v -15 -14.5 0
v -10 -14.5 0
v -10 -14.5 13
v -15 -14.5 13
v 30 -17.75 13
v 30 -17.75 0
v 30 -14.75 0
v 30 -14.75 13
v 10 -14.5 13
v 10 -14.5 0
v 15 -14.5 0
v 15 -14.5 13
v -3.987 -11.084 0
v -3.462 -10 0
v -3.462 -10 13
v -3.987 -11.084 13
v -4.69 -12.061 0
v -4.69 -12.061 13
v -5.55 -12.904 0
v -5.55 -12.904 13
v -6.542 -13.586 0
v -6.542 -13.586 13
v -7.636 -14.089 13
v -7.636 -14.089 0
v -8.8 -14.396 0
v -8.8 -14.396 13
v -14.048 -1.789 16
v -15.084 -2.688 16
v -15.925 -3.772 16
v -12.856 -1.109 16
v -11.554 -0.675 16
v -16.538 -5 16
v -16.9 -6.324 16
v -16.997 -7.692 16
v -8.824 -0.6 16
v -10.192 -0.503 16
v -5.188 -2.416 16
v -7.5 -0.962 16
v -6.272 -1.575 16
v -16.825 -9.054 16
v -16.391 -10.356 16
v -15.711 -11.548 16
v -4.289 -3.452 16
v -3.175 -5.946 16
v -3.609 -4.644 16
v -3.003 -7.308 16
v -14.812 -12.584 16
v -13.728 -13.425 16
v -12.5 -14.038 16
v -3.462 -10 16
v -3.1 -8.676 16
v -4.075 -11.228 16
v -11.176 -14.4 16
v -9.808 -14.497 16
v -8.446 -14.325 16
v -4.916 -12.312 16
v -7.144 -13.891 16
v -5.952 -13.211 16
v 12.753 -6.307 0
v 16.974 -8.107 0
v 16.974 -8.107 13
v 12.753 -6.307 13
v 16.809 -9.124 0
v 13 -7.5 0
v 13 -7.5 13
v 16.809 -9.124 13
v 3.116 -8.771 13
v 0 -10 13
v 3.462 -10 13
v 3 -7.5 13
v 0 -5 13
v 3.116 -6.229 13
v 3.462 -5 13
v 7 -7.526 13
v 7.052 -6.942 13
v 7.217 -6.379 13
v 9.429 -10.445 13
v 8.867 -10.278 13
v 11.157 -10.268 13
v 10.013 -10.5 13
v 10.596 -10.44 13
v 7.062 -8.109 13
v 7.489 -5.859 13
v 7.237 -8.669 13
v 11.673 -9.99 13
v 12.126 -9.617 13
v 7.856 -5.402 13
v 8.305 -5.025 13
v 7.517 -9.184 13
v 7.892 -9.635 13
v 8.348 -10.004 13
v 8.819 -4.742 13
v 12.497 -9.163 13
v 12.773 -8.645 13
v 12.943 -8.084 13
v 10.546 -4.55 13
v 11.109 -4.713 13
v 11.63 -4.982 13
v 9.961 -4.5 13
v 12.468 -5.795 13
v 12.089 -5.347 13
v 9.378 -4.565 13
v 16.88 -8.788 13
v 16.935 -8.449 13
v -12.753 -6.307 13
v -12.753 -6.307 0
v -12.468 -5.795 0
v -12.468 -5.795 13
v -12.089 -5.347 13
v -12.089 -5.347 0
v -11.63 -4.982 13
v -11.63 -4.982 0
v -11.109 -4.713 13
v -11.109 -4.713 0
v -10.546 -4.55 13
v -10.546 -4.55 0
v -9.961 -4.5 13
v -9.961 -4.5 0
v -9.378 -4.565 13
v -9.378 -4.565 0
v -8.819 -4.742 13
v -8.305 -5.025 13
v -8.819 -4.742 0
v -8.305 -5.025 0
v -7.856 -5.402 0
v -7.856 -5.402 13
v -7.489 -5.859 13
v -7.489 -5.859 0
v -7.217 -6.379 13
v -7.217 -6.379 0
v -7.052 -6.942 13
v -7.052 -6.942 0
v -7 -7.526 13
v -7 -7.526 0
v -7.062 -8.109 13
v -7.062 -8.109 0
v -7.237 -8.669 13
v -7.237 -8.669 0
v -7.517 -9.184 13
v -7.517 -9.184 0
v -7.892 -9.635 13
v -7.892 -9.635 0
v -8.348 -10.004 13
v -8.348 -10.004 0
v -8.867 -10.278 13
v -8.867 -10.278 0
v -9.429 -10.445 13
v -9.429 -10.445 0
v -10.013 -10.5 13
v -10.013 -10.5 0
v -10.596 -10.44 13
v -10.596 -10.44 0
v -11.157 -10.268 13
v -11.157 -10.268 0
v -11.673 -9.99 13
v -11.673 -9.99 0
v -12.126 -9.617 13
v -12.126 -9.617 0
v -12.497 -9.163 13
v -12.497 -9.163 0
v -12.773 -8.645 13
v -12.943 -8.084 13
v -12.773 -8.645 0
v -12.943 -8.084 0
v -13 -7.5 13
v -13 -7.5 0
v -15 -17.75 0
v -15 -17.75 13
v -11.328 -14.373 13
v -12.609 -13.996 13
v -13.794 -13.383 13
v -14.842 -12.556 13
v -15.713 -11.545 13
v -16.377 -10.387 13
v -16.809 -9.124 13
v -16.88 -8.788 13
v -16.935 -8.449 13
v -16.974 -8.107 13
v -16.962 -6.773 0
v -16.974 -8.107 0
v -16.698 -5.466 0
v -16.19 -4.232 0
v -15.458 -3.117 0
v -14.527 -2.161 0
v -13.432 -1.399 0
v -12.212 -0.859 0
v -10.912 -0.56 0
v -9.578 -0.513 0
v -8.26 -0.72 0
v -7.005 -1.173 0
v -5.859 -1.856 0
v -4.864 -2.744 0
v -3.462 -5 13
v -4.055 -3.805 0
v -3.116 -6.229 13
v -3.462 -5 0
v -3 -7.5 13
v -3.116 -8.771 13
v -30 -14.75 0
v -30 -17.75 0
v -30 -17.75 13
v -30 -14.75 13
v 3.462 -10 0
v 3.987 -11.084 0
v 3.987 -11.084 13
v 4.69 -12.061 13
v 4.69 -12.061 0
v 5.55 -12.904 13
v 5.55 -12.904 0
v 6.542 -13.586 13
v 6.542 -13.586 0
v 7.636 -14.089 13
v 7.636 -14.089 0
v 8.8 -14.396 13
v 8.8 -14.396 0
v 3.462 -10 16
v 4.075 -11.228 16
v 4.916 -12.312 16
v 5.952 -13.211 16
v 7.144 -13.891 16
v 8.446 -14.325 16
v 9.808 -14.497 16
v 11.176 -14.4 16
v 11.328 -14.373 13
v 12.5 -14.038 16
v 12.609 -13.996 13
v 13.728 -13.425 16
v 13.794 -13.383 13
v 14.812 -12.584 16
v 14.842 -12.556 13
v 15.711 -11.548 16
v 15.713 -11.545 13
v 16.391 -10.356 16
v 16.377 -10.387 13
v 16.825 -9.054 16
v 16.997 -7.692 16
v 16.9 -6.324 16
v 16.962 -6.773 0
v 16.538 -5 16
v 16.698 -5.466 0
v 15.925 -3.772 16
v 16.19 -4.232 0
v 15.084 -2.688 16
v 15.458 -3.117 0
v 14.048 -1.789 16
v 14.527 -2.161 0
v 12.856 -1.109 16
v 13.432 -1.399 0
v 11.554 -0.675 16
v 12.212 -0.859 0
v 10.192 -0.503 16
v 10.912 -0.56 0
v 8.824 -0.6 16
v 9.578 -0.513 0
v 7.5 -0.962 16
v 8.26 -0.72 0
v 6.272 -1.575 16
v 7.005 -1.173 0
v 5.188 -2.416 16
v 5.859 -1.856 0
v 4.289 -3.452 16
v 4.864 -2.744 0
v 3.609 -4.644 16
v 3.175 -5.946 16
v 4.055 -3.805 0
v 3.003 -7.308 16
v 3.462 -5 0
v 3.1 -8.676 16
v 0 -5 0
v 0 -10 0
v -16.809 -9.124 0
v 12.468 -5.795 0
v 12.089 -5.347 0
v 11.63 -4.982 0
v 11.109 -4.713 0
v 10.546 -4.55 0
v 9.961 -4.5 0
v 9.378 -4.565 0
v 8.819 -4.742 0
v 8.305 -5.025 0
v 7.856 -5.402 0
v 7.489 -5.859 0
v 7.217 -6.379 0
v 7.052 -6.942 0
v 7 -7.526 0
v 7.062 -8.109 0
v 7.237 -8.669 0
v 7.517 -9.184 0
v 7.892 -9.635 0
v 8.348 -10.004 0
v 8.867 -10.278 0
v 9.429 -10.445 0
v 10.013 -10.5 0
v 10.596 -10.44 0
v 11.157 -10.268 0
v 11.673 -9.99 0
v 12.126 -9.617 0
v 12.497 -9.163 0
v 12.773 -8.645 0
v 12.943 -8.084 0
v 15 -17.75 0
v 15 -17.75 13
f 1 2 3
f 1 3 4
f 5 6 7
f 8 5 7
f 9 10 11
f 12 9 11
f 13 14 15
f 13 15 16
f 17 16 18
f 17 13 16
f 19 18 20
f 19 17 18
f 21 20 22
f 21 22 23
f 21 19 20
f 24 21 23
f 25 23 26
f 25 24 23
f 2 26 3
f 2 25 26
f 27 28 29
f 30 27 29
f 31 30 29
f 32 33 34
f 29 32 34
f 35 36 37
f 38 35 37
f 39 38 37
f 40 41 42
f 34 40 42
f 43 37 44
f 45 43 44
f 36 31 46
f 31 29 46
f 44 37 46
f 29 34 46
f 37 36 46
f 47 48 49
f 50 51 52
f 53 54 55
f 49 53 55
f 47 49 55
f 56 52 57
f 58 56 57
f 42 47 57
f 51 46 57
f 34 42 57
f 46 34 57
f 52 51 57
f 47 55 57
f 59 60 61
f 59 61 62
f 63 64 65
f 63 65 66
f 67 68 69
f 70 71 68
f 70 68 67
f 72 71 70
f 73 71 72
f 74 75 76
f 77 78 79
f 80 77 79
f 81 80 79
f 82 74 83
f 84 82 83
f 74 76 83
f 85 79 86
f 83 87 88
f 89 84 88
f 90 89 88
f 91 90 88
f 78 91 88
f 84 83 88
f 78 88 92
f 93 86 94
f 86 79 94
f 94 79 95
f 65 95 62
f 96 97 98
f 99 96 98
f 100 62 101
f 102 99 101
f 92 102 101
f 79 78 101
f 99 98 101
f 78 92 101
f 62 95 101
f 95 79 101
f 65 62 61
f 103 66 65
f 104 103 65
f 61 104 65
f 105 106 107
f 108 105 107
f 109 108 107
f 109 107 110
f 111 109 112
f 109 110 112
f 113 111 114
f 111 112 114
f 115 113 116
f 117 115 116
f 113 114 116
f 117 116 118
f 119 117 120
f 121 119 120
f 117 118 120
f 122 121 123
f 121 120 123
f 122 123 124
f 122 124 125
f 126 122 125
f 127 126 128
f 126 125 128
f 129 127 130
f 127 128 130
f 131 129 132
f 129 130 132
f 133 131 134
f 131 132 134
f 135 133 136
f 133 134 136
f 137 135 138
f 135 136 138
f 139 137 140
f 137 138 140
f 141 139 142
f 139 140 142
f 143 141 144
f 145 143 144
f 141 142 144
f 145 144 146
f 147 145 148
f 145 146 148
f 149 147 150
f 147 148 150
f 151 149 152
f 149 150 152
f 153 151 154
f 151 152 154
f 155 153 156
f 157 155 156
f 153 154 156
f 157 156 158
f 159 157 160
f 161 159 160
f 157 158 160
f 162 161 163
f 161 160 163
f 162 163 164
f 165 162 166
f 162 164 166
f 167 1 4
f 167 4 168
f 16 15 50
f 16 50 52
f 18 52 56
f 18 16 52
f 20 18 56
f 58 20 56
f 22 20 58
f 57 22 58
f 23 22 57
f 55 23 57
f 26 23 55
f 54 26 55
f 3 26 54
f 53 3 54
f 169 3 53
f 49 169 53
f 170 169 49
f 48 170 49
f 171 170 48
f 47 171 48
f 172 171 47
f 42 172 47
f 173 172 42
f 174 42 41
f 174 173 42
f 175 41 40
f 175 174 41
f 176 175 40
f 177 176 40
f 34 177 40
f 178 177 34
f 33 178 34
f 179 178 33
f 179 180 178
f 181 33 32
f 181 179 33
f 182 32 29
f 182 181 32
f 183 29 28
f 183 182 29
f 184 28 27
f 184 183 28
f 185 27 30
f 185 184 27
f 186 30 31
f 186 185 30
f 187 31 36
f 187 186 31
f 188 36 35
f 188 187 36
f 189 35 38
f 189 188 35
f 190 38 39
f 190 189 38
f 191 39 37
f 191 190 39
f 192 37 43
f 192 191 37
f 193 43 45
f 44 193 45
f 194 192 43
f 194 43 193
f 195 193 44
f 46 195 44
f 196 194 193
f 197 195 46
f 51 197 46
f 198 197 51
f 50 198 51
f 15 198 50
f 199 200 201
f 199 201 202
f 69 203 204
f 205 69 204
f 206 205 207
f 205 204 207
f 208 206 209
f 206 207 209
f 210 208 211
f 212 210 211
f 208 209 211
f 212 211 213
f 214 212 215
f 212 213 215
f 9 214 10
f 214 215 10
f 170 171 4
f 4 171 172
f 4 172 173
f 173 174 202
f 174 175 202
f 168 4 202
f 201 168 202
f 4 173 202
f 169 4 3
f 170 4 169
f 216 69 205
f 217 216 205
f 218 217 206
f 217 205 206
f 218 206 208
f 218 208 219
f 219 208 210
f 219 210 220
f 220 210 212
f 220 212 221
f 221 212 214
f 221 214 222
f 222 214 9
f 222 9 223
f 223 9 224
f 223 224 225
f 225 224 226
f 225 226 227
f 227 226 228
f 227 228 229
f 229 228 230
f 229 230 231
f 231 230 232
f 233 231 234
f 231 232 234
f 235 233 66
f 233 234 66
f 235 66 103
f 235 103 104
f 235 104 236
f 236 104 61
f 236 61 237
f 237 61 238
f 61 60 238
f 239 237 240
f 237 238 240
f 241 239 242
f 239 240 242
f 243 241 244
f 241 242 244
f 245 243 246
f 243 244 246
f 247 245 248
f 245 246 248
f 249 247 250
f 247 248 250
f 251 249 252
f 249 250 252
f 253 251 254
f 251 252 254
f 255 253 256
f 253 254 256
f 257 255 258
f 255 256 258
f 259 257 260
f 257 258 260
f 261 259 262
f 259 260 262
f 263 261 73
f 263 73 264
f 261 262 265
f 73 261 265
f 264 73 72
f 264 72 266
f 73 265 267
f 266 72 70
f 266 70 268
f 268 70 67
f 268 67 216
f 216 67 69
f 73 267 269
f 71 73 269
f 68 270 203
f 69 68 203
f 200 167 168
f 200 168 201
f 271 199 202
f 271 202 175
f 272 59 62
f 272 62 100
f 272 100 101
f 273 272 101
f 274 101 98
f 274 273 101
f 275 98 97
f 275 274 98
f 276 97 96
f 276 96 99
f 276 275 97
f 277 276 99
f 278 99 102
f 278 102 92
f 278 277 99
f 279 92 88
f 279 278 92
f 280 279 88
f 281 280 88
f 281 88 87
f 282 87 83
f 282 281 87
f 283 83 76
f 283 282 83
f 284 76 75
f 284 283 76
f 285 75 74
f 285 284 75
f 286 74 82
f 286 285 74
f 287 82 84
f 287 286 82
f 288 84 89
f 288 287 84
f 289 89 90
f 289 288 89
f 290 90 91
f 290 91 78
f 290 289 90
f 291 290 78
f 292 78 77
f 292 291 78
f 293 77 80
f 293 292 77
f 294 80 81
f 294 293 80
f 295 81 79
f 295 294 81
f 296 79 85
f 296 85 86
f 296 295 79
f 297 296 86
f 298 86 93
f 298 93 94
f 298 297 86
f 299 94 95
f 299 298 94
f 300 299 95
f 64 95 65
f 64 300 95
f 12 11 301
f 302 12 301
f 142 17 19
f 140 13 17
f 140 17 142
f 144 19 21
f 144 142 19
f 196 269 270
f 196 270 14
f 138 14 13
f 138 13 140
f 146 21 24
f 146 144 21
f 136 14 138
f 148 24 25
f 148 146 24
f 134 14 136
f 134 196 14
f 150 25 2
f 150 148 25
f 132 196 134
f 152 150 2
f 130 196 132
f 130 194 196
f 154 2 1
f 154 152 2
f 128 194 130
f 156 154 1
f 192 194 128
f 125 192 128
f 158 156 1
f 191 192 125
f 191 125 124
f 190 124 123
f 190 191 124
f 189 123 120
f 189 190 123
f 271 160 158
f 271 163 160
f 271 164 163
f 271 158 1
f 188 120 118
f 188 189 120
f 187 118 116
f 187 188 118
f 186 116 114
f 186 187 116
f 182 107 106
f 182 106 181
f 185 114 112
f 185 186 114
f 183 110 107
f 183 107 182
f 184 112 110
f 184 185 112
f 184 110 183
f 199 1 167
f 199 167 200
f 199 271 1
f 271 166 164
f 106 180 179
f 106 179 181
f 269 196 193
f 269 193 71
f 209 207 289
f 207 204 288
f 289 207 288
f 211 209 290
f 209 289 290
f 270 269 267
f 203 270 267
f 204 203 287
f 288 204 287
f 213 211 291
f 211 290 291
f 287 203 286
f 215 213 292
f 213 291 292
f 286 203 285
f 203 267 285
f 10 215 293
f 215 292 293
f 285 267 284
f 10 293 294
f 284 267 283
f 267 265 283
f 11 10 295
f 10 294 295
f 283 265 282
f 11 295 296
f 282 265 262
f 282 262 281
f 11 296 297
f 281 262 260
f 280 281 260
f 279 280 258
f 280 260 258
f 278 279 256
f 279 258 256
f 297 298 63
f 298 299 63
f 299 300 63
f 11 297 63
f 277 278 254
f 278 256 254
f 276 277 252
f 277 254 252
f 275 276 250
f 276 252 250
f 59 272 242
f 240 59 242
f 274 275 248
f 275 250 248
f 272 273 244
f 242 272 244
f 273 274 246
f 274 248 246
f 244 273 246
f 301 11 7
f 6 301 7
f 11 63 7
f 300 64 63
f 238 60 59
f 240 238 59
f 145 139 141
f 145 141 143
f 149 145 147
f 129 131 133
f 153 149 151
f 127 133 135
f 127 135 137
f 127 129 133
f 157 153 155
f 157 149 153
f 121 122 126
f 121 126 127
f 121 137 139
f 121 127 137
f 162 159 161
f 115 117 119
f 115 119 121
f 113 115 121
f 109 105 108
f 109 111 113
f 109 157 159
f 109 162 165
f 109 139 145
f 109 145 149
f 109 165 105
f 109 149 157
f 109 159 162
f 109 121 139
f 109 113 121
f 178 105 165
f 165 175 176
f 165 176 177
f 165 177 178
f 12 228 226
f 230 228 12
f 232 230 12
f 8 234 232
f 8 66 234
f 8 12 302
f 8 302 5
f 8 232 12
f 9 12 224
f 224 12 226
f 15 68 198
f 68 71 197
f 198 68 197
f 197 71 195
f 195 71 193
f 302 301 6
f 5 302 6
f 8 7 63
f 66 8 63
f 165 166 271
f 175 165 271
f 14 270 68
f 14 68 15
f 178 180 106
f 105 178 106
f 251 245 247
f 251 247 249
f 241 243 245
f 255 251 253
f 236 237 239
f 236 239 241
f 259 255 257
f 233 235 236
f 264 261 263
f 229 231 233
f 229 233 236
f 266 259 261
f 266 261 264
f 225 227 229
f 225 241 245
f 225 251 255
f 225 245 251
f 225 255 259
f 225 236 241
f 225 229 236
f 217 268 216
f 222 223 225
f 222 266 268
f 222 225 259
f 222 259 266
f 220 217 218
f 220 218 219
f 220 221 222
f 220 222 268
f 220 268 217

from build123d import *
from build123d.topology import SkipClean

# Parameters (mm, degrees)
SKETCH1_R           = 7
BOSS_EXTRUDE1_DEPTH = 13
SKETCH2_R           = 7
BOSS_EXTRUDE2_DEPTH = 3
SKETCH3_R           = 3
CUT_EXTRUDE1_DEPTH  = 13


with BuildPart() as part:
    # Sketch1 → Boss-Extrude1 (new body)
    with BuildSketch(Plane.XY):
        with BuildLine():
            ThreePointArc((16.808917195, -9.124391157), (14.337583538, -12.994121317), (10, -14.5))
            Line((10, -14.5), (15, -14.5))
            Line((15, -14.5), (15, -17.75))
            Line((15, -17.75), (30, -17.75))
            Line((30, -17.75), (30, -14.75))
            Line((30, -14.75), (16.808917195, -9.124391157))
        make_face()
        with Locations((10, -7.5)):
            Circle(SKETCH1_R)
        with BuildLine():
            Line((0, -10), (3.461651585, -10))
            ThreePointArc((3.461651585, -10), (3, -7.5), (3.461651585, -5))
            Line((3.461651585, -5), (0, -5))
            Line((0, -5), (0, -10))
        make_face()
    extrude(amount=BOSS_EXTRUDE1_DEPTH)

    # Sketch2 → Boss-Extrude2 (add)
    with BuildSketch(Plane.XY.offset(13)):
        with Locations(Location((10, -7.5, 0), (0, 0, 200.924832428))):
            Circle(SKETCH2_R)
    extrude(amount=BOSS_EXTRUDE2_DEPTH)

    # Sketch3 → Cut-Extrude1 (cut)
    with BuildSketch(Plane.XY):
        with Locations((10, -7.5)):
            Circle(SKETCH3_R)
        with BuildLine():
            Line((16.808917195, -9.124391157), (17.20120329, -8.204547899))
            Line((17.20120329, -8.204547899), (12.752773317, -6.307423351))
            ThreePointArc((12.752773317, -6.307423351), (12.937543187, -6.891033643), (13, -7.5))
            Line((13, -7.5), (16.808917195, -9.124391157))
        make_face()
    extrude(amount=CUT_EXTRUDE1_DEPTH, mode=Mode.SUBTRACT)

    # Mirror1: part across plane


with BuildPart() as part_1:
    with SkipClean():  # the faces are left unmerged after this step: merging them gives an invalid solid
        add(part.part)
        add(part.part.mirror(Plane(origin=(0, 0, 0), x_dir=(0, 0, 1), z_dir=(1, 0, 0))))


solid = part_1.part
